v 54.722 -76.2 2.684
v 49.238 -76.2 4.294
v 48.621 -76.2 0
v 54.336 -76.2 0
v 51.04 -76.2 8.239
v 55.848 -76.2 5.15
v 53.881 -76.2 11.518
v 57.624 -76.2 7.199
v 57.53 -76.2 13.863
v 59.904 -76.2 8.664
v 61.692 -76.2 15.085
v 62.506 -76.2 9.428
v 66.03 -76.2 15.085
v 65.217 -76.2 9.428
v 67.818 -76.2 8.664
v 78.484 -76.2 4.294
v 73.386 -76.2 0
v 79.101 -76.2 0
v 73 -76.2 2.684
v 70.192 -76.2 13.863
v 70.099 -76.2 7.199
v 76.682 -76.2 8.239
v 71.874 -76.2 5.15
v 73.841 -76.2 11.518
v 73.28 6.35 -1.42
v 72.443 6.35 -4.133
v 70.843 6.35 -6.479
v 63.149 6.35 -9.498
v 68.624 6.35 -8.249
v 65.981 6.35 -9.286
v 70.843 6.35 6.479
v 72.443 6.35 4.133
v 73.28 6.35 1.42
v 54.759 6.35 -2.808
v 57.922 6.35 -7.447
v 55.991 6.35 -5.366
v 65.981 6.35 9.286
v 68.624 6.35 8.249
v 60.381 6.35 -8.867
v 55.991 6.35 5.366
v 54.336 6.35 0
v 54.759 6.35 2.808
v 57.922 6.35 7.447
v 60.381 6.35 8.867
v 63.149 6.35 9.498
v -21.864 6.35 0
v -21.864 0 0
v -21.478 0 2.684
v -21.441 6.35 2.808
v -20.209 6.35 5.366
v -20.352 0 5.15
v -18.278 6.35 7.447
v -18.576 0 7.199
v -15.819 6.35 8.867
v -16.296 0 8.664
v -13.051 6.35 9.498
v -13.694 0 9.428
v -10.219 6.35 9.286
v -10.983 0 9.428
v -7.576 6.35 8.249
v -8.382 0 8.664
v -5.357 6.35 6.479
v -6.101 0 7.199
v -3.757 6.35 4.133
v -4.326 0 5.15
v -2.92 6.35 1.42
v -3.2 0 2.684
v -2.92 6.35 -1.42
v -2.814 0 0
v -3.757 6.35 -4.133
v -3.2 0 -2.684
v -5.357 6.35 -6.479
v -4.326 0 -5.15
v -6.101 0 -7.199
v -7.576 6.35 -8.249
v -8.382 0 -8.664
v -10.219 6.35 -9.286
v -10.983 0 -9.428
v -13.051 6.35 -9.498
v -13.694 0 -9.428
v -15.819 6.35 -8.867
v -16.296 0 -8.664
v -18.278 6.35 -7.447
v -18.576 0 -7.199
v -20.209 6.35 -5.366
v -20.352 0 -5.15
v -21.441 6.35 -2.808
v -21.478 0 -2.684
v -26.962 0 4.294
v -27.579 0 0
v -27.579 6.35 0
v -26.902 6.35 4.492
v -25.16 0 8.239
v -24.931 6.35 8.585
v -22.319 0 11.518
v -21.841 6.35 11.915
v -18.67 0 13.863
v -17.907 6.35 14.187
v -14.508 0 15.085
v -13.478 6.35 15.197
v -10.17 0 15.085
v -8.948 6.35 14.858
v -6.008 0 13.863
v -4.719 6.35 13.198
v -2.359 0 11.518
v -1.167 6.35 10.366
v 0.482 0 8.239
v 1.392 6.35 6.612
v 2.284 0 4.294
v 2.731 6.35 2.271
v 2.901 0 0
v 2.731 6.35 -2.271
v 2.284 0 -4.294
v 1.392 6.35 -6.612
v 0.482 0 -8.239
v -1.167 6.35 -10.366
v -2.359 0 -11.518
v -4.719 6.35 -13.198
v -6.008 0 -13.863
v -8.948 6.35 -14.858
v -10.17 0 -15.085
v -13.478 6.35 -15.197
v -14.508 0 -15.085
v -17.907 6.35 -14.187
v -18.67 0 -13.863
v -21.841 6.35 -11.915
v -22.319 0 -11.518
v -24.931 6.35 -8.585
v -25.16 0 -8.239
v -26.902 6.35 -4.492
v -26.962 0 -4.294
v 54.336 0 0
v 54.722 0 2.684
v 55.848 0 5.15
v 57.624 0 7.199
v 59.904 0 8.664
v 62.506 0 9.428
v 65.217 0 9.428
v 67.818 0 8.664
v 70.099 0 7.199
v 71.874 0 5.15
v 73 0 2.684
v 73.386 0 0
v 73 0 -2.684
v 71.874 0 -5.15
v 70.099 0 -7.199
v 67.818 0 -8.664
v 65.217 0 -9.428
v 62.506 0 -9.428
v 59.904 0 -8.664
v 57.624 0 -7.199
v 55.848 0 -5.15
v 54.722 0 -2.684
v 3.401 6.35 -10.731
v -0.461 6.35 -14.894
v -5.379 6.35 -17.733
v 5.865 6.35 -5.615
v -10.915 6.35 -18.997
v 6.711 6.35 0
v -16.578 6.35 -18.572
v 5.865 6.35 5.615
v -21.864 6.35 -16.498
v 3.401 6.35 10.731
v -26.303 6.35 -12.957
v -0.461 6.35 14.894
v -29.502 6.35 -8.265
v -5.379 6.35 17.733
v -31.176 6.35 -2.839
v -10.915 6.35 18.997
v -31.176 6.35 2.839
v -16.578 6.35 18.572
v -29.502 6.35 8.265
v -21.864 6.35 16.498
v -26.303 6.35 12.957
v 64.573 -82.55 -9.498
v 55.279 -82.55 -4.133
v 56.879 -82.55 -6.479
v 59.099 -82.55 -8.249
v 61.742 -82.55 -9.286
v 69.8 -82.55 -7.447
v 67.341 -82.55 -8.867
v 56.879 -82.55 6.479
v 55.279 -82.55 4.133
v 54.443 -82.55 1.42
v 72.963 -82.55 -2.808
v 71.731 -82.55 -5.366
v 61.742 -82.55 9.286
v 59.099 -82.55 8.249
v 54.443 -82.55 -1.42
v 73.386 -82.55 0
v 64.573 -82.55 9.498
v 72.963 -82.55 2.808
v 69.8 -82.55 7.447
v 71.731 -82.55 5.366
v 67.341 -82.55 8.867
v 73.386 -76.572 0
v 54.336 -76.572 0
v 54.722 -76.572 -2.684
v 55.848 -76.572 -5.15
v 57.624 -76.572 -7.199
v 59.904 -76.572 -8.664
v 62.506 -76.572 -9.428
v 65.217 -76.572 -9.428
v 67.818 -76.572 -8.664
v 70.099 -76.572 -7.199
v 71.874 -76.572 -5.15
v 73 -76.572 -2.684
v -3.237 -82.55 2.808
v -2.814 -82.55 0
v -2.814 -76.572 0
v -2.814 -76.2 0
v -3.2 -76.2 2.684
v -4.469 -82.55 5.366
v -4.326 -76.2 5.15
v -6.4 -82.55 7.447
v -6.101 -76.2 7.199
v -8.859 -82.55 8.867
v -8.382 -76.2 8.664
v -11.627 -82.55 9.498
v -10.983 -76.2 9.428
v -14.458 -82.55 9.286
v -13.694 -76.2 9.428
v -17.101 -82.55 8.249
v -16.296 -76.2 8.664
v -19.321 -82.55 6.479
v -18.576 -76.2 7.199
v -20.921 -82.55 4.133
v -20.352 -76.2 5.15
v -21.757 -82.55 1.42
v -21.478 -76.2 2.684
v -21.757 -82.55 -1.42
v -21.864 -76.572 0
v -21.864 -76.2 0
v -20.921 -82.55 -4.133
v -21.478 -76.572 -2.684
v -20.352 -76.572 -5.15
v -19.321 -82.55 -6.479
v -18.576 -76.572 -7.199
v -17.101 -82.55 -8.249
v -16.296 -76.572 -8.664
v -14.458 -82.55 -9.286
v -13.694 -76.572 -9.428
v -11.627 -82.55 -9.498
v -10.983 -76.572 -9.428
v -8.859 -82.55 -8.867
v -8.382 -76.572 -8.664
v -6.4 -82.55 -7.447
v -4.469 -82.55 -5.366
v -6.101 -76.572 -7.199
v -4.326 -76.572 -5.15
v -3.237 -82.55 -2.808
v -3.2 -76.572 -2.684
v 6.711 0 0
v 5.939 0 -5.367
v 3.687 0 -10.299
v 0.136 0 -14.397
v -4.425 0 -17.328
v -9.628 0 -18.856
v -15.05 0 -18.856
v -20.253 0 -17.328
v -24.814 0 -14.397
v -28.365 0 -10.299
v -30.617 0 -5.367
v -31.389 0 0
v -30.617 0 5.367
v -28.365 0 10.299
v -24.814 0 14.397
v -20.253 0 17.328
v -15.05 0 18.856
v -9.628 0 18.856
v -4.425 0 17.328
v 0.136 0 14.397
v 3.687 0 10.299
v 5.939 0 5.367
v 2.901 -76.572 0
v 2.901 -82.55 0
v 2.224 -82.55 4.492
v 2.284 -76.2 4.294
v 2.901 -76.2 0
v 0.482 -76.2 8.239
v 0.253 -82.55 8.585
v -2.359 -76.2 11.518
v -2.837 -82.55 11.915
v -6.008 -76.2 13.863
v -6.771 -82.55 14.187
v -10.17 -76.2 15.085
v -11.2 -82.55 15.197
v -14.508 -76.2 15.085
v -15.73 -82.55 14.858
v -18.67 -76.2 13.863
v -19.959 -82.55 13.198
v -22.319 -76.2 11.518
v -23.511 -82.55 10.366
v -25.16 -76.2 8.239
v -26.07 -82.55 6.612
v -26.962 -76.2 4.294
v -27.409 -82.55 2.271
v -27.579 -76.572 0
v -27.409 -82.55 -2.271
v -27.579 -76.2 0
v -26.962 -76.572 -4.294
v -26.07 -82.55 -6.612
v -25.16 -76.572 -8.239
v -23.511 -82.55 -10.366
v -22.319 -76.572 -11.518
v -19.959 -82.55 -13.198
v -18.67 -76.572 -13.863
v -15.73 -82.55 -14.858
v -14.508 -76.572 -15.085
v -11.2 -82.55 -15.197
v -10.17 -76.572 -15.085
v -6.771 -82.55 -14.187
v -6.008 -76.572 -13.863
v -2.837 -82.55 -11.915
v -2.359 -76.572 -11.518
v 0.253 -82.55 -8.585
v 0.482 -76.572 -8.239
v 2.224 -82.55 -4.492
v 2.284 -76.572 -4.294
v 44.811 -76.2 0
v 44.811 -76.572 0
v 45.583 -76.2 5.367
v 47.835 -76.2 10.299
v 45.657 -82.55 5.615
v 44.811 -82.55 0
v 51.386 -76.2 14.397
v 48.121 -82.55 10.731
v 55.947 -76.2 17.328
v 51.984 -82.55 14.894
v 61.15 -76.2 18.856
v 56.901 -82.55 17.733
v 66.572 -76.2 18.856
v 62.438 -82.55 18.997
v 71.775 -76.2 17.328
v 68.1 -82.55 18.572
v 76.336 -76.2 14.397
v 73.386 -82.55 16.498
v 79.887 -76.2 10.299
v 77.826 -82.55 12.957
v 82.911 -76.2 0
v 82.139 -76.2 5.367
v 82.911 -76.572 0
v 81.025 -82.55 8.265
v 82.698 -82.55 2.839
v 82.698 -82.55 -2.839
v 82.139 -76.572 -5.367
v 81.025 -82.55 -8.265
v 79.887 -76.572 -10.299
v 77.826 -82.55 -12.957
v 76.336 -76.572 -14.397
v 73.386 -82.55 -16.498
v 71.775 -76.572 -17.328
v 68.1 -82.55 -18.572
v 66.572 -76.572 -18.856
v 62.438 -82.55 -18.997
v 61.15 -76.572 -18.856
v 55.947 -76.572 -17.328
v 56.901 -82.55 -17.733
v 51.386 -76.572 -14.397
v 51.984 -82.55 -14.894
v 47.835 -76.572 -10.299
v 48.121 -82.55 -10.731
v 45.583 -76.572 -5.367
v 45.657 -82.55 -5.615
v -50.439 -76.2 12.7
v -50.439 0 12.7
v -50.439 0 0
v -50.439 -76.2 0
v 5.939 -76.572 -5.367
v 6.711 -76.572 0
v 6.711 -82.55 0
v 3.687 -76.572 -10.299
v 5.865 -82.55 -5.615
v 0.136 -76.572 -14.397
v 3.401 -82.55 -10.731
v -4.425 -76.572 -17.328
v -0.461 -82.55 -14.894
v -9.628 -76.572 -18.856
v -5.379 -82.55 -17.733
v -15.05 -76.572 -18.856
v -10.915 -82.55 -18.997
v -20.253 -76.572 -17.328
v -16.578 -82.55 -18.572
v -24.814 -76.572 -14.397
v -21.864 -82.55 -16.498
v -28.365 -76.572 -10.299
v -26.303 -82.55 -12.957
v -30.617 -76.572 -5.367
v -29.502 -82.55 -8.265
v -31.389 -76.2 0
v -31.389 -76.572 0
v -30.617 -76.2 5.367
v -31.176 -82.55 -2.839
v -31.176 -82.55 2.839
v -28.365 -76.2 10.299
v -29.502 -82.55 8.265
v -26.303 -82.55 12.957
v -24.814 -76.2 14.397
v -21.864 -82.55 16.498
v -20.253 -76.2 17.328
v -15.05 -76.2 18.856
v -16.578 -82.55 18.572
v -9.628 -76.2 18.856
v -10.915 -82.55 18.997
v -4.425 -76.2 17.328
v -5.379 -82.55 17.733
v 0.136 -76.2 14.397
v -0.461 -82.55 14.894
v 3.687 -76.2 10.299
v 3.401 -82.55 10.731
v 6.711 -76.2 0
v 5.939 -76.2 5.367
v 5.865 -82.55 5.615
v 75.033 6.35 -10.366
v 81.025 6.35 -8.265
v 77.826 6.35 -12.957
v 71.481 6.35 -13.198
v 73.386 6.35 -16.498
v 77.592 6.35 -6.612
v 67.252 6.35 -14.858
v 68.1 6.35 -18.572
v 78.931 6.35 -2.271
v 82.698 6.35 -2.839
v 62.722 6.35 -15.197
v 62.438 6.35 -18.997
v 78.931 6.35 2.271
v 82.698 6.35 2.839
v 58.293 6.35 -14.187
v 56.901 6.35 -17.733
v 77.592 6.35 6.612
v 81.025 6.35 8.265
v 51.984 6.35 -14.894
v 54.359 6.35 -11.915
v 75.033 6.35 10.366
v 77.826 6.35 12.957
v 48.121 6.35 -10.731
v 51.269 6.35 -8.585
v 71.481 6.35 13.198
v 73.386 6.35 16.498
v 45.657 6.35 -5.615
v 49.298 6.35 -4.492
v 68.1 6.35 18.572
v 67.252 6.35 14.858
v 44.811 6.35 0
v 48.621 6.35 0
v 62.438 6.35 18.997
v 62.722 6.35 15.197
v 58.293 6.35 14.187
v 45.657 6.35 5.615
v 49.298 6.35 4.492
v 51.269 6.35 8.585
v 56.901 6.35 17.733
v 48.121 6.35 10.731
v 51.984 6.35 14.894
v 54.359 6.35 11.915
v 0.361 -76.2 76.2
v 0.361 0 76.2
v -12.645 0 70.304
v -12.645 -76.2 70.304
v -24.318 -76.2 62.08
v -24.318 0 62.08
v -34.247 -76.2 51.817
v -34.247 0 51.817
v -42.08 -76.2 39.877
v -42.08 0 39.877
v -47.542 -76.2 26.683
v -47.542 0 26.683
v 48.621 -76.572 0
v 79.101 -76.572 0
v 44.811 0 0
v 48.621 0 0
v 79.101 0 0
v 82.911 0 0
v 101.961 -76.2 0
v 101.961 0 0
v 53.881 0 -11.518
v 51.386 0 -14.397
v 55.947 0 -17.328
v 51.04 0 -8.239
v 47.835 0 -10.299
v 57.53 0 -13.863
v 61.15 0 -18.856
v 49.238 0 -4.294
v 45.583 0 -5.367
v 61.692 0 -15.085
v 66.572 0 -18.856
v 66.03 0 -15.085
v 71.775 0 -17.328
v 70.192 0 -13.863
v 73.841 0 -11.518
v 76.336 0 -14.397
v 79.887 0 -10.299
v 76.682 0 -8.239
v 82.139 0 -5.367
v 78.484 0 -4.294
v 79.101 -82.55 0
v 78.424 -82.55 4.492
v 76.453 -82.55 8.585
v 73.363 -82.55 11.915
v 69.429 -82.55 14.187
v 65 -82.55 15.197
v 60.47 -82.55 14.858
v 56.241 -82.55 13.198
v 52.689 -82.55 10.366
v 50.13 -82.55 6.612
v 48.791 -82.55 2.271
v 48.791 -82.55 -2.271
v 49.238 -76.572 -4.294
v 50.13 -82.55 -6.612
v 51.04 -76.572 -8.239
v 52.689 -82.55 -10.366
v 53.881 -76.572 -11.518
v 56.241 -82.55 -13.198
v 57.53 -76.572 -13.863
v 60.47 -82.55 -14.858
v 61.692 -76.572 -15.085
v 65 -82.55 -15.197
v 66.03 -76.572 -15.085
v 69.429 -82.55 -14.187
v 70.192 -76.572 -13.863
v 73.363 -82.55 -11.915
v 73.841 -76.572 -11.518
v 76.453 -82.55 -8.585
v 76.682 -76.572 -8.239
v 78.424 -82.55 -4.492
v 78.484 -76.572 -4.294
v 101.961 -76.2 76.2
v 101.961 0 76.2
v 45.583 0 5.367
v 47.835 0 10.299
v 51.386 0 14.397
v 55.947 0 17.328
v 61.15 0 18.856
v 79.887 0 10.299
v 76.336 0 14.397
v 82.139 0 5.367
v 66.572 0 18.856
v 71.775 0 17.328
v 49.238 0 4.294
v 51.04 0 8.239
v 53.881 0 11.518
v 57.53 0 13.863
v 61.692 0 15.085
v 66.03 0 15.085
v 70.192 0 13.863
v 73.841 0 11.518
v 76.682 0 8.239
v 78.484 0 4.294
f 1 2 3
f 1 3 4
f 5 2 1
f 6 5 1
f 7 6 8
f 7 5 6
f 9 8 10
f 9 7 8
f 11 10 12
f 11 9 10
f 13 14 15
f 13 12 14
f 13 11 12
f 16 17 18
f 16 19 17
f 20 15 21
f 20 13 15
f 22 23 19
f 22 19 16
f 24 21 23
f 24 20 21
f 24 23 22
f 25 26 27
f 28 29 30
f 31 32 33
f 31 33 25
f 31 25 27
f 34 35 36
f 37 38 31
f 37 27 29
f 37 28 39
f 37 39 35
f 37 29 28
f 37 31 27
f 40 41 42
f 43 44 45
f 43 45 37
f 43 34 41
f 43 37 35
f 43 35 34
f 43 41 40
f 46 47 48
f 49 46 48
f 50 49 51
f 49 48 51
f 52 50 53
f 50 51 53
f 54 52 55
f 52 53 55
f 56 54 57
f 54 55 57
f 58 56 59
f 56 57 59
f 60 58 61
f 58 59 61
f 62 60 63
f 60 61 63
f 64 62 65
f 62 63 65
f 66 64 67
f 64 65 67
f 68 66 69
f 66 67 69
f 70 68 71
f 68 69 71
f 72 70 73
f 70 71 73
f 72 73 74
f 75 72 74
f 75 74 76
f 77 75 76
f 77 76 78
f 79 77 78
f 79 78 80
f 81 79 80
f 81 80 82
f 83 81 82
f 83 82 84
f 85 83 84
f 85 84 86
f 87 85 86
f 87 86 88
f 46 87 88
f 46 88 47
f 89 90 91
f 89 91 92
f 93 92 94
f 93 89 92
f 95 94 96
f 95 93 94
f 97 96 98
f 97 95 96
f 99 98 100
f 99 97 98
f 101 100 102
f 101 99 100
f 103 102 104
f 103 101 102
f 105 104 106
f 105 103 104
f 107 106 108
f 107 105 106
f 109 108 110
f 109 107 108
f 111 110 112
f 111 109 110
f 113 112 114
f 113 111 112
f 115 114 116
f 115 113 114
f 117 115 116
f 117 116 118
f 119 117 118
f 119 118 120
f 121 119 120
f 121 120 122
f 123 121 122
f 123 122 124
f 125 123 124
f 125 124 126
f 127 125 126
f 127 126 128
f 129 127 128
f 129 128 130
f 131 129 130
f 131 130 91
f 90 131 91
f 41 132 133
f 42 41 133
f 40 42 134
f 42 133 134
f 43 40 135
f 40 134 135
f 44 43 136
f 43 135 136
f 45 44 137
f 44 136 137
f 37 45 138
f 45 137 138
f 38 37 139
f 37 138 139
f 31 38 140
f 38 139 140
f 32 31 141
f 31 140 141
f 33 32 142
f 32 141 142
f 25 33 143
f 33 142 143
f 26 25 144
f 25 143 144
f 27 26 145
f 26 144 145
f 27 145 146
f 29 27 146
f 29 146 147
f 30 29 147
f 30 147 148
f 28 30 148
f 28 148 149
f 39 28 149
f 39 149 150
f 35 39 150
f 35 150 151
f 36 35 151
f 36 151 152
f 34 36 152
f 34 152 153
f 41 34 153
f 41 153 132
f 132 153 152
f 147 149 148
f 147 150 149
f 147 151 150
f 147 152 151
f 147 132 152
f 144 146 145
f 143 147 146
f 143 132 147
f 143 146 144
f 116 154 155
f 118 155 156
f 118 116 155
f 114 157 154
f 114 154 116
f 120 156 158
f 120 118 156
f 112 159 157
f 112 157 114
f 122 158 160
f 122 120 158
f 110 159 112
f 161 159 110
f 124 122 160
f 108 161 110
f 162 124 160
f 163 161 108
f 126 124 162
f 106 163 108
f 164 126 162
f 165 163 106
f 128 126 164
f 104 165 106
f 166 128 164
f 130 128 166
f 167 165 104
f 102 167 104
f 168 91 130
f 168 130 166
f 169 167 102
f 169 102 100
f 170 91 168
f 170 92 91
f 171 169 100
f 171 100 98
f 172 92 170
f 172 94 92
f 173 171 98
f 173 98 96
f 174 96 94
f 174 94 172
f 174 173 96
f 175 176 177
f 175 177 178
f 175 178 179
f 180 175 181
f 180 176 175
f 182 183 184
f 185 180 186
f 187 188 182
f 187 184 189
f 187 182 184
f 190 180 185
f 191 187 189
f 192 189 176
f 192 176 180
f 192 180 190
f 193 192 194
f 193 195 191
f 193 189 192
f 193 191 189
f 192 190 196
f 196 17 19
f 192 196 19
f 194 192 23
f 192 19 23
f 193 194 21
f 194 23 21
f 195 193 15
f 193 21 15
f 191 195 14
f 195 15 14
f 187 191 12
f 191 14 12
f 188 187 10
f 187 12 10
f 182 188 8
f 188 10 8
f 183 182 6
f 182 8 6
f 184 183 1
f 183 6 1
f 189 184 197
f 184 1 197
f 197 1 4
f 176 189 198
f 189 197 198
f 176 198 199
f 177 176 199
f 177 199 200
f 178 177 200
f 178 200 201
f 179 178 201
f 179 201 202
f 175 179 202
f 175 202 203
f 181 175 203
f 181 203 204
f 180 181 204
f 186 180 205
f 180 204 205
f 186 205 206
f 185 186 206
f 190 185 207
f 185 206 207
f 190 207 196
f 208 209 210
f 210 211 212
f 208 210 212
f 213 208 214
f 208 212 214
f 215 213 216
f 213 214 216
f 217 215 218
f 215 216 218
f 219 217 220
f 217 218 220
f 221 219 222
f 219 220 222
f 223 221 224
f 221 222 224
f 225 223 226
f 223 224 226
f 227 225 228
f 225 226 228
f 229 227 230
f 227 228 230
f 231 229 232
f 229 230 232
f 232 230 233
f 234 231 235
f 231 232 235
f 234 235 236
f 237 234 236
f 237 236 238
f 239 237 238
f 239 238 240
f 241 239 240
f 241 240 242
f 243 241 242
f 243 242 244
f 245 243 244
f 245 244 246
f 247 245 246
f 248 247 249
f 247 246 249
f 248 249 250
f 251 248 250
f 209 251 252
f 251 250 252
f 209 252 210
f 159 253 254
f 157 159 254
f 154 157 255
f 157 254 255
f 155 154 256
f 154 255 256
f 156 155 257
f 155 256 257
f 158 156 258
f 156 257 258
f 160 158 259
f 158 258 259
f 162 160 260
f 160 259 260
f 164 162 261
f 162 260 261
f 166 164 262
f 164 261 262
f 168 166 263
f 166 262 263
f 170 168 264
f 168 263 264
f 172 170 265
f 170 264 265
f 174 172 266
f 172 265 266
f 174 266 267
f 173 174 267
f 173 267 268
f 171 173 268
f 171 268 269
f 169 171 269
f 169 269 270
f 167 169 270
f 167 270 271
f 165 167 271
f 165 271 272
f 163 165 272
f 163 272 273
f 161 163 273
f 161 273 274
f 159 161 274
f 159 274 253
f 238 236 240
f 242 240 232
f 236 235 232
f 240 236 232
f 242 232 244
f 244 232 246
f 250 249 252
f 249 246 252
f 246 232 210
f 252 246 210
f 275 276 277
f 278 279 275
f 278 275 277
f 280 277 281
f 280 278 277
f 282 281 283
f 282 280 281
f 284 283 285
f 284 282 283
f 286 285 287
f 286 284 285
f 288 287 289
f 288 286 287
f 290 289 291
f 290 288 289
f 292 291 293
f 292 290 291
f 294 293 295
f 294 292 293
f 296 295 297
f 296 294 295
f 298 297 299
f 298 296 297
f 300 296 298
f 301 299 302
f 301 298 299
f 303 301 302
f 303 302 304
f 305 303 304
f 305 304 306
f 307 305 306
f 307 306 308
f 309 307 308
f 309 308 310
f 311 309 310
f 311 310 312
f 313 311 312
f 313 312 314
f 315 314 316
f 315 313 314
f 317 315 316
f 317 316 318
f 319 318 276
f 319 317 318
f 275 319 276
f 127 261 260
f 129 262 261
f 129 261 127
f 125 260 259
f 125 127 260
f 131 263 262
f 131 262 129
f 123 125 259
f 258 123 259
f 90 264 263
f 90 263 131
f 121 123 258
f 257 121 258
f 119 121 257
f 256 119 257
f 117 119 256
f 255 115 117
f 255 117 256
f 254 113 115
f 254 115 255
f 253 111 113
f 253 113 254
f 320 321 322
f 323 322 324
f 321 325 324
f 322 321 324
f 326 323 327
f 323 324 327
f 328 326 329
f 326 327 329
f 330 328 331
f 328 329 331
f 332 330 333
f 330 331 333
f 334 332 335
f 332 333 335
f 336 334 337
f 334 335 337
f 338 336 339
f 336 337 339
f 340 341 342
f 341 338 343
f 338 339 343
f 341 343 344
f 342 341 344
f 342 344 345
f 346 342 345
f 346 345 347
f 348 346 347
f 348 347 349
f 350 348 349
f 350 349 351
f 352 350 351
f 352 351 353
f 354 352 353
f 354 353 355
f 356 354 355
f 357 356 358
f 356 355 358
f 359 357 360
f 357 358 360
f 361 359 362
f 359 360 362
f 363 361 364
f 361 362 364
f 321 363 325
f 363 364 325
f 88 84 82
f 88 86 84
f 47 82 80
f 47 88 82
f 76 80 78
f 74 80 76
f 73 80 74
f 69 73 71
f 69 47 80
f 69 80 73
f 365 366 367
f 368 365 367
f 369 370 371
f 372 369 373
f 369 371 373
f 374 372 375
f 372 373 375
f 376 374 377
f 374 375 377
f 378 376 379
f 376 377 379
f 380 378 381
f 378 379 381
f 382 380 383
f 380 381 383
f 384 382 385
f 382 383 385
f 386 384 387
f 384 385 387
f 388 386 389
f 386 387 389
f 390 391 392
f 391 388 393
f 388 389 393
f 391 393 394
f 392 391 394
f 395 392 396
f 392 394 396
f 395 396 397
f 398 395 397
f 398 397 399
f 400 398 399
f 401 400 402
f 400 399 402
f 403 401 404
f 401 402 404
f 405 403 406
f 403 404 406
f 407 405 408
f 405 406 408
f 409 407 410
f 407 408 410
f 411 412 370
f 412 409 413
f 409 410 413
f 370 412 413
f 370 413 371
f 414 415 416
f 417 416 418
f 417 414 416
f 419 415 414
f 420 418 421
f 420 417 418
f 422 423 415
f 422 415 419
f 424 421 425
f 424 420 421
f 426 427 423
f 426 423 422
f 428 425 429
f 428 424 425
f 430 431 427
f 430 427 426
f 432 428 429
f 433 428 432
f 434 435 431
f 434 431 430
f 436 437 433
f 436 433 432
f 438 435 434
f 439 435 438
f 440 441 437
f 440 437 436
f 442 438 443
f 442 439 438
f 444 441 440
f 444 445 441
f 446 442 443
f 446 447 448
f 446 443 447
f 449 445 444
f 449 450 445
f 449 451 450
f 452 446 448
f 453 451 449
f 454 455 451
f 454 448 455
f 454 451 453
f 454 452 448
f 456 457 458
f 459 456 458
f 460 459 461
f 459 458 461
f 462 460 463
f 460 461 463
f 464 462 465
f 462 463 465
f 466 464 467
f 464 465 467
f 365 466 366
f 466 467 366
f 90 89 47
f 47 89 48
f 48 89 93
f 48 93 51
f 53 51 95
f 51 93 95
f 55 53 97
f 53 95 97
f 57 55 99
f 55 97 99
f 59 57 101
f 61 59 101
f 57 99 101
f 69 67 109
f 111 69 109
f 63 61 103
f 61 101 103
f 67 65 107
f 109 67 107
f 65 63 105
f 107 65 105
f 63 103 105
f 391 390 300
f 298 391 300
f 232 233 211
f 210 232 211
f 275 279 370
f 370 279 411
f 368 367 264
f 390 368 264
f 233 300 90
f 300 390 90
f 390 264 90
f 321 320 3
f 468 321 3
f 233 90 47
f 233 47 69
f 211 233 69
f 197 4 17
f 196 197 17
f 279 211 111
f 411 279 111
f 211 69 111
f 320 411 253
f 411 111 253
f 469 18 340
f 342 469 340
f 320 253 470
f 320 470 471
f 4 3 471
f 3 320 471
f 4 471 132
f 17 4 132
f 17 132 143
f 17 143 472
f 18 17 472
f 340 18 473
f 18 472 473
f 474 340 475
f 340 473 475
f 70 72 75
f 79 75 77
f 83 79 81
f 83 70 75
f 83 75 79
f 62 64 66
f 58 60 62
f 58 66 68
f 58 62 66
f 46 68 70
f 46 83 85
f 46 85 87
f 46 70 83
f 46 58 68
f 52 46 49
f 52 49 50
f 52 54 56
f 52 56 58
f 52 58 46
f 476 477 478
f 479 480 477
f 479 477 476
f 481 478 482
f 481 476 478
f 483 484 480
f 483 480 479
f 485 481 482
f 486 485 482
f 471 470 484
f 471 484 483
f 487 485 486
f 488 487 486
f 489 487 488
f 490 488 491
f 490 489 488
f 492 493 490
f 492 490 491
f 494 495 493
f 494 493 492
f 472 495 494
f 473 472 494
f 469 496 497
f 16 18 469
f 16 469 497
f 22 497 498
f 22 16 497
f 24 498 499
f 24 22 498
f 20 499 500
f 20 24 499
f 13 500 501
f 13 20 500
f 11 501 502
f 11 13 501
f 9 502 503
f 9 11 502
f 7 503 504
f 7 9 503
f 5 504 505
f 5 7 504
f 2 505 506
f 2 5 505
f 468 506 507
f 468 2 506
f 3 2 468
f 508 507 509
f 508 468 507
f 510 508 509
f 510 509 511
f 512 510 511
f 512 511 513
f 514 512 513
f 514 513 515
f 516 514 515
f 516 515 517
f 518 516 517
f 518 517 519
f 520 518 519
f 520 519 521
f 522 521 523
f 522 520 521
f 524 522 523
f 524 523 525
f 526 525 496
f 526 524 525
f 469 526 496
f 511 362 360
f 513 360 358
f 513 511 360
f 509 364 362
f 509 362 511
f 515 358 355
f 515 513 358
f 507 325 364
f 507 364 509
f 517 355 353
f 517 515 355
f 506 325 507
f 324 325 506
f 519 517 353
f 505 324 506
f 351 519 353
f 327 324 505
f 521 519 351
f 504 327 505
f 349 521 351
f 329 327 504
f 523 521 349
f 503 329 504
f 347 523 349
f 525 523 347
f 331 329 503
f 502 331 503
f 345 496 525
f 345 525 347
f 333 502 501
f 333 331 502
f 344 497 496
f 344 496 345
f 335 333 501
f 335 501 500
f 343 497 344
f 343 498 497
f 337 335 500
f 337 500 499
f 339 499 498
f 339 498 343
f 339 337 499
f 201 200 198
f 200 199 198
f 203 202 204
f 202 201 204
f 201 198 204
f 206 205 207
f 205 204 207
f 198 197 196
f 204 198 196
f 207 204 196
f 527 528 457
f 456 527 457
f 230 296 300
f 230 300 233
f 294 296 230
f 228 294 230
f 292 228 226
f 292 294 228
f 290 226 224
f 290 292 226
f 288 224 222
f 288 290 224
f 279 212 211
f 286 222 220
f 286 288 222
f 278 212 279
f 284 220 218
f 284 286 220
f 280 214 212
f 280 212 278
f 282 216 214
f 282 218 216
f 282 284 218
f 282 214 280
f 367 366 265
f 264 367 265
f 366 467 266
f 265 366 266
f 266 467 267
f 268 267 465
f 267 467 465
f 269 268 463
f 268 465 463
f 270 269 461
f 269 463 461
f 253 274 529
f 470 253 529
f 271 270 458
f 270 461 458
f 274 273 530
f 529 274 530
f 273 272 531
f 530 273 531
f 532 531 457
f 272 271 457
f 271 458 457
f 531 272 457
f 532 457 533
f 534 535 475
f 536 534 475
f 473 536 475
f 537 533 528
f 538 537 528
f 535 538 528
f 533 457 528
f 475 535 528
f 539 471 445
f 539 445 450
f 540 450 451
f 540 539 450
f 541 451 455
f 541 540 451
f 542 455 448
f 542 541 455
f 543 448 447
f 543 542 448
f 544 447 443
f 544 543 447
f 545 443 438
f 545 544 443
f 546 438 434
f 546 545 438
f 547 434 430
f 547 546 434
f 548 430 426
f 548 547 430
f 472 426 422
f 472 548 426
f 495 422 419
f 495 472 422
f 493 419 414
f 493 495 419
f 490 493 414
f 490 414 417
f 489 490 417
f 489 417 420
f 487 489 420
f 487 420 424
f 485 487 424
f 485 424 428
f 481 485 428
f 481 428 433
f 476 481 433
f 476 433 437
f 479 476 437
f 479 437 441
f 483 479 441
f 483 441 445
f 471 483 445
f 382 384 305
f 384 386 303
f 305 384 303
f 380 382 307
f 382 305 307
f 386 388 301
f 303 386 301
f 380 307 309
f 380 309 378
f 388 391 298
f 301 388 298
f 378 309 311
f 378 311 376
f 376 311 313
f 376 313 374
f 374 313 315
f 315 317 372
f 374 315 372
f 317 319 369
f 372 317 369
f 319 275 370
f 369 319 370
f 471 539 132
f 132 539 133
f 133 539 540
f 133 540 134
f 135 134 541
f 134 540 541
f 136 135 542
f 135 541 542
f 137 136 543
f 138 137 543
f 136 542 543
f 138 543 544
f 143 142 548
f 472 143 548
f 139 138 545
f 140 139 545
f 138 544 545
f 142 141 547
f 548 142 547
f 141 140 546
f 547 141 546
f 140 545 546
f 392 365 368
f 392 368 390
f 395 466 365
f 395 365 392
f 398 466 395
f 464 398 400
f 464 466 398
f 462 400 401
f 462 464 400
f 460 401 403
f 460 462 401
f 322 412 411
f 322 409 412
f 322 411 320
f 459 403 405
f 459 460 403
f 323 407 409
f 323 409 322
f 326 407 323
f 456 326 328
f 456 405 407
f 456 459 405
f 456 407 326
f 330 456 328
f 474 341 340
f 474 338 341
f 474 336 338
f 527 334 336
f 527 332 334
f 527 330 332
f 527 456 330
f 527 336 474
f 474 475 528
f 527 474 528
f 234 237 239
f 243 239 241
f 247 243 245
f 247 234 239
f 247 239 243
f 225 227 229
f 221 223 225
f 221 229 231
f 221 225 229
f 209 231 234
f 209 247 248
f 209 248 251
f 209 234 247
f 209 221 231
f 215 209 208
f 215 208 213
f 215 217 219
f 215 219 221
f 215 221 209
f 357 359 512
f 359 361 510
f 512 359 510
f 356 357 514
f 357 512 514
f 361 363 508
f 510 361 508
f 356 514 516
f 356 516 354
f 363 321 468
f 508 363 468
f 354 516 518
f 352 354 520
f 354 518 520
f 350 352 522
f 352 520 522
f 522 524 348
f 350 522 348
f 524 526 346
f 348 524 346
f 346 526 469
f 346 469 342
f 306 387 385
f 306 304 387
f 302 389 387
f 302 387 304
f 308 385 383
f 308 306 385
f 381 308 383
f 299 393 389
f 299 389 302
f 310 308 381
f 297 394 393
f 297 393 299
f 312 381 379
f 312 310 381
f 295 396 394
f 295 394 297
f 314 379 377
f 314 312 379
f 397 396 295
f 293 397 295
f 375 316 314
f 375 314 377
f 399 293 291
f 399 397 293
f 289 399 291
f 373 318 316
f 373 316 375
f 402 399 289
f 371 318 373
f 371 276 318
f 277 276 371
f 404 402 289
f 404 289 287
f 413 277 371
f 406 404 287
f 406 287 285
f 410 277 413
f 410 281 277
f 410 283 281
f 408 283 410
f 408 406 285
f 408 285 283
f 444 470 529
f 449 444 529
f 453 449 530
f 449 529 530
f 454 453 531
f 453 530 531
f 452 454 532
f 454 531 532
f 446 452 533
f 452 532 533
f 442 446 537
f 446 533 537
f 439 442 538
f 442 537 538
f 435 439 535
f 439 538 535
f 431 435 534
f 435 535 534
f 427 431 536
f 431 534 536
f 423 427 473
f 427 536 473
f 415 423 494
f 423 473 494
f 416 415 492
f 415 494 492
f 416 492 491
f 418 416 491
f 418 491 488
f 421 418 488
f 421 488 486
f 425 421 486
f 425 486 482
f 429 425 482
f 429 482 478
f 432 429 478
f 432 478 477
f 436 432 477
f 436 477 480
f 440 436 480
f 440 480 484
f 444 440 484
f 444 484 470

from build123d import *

# Parameters (mm, degrees)
F1_DEPTH = 76.2
F2_R     = 15.24
F3_DEPTH = 6.35
F2_R_2   = 9.525
F4_DEPTH = 6.35
F5_R     = 15.24
F6_DEPTH = 6.35
F5_R_2   = 9.525
F7_DEPTH = 6.35
F8_W     = 152.5372415781
F8_H     = 76.57238096
F9_DEPTH = 25.4


with BuildPart() as f1:
    # F0 (on Front) → F1 (new body)
    with BuildSketch(Plane.XZ):
        with BuildLine():
            Line((82.9111417405, 0), (101.9611417405, 0))
            Line((101.9611417405, 0), (101.9611417405, 76.2))
            Line((101.9611417405, 76.2), (0.3611417405, 76.2))
            ThreePointArc((0.3611417405, 76.2), (-34.2470067394, 51.816518784), (-50.4388582595, 12.7))
            Line((-50.4388582595, 12.7), (-50.4388582595, 0))
            Line((-50.4388582595, 0), (-31.3888582595, 0))
            ThreePointArc((-31.3888582595, 0), (-12.3388582595, 19.05), (6.7111417405, 0))
            Line((6.7111417405, 0), (44.8111417405, 0))
            ThreePointArc((44.8111417405, 0), (63.8611417405, 19.05), (82.9111417405, 0))
        make_face()
        with BuildLine():
            ThreePointArc((44.8111417405, 0), (63.8611417405, -19.05), (82.9111417405, 0))
            Line((82.9111417405, 0), (63.8611417405, 0))
            Line((63.8611417405, 0), (44.8111417405, 0))
        make_face()
        with BuildLine():
            Line((63.8611417405, 0), (82.9111417405, 0))
            ThreePointArc((82.9111417405, 0), (63.8611417405, 19.05), (44.8111417405, 0))
            Line((44.8111417405, 0), (63.8611417405, 0))
        make_face()
        with BuildLine():
            Line((-12.3388582595, 0), (6.7111417405, 0))
            ThreePointArc((6.7111417405, 0), (-12.3388582595, 19.05), (-31.3888582595, 0))
            Line((-31.3888582595, 0), (-12.3388582595, 0))
        make_face()
        with BuildLine():
            ThreePointArc((-31.3888582595, 0), (-12.3388582595, -19.05), (6.7111417405, 0))
            Line((6.7111417405, 0), (-12.3388582595, 0))
            Line((-12.3388582595, 0), (-31.3888582595, 0))
        make_face()
    extrude(amount=F1_DEPTH)

    # F2 (on face) → F3 (join)
    with BuildSketch(Plane.XZ.offset(76.2)):
        with BuildLine():
            ThreePointArc((82.9111417405, 0), (63.8611417405, 19.05), (44.8111417405, 0))
            ThreePointArc((44.8111417405, 0), (63.8611417405, -19.05), (82.9111417405, 0))
        make_face()
        with Locations((63.8611417405, 0)):
            Circle(F2_R, mode=Mode.SUBTRACT)
        with BuildLine():
            ThreePointArc((-31.3888582595, 0), (-12.3388582595, -19.05), (6.7111417405, 0))
            ThreePointArc((6.7111417405, 0), (-12.3388582595, 19.05), (-31.3888582595, 0))
        make_face()
        with Locations((-12.3388582595, 0)):
            Circle(F2_R, mode=Mode.SUBTRACT)
    extrude(amount=F3_DEPTH)

    # F2 (on face) → F4 (join)
    with BuildSketch(Plane.XZ.offset(76.2)):
        with Locations((63.8611417405, 0)):
            Circle(F2_R_2)
        with Locations((-12.3388582595, 0)):
            Circle(F2_R_2)
    extrude(amount=F4_DEPTH)

    # F5 (on face) → F6 (join)
    with BuildSketch(Plane(origin=(0, 0, 0), x_dir=(-1, 0, 0), z_dir=(0, 1, 0))):
        with BuildLine():
            ThreePointArc((-82.9111417405, 0), (-63.8611417405, -19.05), (-44.8111417405, 0))
            ThreePointArc((-44.8111417405, 0), (-63.8611417405, 19.05), (-82.9111417405, 0))
        make_face()
        with Locations((-63.8611417405, 0)):
            Circle(F5_R, mode=Mode.SUBTRACT)
        with BuildLine():
            ThreePointArc((31.3888582595, 0), (12.3388582595, 19.05), (-6.7111417405, 0))
            ThreePointArc((-6.7111417405, 0), (12.3388582595, -19.05), (31.3888582595, 0))
        make_face()
        with Locations((12.3388582595, 0)):
            Circle(F5_R, mode=Mode.SUBTRACT)
    extrude(amount=F6_DEPTH)

    # F5 (on face) → F7 (join)
    with BuildSketch(Plane(origin=(0, 0, 0), x_dir=(-1, 0, 0), z_dir=(0, 1, 0))):
        with Locations((-63.8611417405, 0)):
            Circle(F5_R_2)
        with Locations((12.3388582595, 0)):
            Circle(F5_R_2)
    extrude(amount=F7_DEPTH)

    # F8 (on face) → F9 (cut)
    with BuildSketch(Plane(origin=(0, 0, 0), x_dir=(1, 0, 0), z_dir=(0, 0, -1))):
        with Locations((25.47326684, 38.28619048)):
            Rectangle(F8_W, F8_H)
    extrude(amount=F9_DEPTH, mode=Mode.SUBTRACT)


solid = f1.part
